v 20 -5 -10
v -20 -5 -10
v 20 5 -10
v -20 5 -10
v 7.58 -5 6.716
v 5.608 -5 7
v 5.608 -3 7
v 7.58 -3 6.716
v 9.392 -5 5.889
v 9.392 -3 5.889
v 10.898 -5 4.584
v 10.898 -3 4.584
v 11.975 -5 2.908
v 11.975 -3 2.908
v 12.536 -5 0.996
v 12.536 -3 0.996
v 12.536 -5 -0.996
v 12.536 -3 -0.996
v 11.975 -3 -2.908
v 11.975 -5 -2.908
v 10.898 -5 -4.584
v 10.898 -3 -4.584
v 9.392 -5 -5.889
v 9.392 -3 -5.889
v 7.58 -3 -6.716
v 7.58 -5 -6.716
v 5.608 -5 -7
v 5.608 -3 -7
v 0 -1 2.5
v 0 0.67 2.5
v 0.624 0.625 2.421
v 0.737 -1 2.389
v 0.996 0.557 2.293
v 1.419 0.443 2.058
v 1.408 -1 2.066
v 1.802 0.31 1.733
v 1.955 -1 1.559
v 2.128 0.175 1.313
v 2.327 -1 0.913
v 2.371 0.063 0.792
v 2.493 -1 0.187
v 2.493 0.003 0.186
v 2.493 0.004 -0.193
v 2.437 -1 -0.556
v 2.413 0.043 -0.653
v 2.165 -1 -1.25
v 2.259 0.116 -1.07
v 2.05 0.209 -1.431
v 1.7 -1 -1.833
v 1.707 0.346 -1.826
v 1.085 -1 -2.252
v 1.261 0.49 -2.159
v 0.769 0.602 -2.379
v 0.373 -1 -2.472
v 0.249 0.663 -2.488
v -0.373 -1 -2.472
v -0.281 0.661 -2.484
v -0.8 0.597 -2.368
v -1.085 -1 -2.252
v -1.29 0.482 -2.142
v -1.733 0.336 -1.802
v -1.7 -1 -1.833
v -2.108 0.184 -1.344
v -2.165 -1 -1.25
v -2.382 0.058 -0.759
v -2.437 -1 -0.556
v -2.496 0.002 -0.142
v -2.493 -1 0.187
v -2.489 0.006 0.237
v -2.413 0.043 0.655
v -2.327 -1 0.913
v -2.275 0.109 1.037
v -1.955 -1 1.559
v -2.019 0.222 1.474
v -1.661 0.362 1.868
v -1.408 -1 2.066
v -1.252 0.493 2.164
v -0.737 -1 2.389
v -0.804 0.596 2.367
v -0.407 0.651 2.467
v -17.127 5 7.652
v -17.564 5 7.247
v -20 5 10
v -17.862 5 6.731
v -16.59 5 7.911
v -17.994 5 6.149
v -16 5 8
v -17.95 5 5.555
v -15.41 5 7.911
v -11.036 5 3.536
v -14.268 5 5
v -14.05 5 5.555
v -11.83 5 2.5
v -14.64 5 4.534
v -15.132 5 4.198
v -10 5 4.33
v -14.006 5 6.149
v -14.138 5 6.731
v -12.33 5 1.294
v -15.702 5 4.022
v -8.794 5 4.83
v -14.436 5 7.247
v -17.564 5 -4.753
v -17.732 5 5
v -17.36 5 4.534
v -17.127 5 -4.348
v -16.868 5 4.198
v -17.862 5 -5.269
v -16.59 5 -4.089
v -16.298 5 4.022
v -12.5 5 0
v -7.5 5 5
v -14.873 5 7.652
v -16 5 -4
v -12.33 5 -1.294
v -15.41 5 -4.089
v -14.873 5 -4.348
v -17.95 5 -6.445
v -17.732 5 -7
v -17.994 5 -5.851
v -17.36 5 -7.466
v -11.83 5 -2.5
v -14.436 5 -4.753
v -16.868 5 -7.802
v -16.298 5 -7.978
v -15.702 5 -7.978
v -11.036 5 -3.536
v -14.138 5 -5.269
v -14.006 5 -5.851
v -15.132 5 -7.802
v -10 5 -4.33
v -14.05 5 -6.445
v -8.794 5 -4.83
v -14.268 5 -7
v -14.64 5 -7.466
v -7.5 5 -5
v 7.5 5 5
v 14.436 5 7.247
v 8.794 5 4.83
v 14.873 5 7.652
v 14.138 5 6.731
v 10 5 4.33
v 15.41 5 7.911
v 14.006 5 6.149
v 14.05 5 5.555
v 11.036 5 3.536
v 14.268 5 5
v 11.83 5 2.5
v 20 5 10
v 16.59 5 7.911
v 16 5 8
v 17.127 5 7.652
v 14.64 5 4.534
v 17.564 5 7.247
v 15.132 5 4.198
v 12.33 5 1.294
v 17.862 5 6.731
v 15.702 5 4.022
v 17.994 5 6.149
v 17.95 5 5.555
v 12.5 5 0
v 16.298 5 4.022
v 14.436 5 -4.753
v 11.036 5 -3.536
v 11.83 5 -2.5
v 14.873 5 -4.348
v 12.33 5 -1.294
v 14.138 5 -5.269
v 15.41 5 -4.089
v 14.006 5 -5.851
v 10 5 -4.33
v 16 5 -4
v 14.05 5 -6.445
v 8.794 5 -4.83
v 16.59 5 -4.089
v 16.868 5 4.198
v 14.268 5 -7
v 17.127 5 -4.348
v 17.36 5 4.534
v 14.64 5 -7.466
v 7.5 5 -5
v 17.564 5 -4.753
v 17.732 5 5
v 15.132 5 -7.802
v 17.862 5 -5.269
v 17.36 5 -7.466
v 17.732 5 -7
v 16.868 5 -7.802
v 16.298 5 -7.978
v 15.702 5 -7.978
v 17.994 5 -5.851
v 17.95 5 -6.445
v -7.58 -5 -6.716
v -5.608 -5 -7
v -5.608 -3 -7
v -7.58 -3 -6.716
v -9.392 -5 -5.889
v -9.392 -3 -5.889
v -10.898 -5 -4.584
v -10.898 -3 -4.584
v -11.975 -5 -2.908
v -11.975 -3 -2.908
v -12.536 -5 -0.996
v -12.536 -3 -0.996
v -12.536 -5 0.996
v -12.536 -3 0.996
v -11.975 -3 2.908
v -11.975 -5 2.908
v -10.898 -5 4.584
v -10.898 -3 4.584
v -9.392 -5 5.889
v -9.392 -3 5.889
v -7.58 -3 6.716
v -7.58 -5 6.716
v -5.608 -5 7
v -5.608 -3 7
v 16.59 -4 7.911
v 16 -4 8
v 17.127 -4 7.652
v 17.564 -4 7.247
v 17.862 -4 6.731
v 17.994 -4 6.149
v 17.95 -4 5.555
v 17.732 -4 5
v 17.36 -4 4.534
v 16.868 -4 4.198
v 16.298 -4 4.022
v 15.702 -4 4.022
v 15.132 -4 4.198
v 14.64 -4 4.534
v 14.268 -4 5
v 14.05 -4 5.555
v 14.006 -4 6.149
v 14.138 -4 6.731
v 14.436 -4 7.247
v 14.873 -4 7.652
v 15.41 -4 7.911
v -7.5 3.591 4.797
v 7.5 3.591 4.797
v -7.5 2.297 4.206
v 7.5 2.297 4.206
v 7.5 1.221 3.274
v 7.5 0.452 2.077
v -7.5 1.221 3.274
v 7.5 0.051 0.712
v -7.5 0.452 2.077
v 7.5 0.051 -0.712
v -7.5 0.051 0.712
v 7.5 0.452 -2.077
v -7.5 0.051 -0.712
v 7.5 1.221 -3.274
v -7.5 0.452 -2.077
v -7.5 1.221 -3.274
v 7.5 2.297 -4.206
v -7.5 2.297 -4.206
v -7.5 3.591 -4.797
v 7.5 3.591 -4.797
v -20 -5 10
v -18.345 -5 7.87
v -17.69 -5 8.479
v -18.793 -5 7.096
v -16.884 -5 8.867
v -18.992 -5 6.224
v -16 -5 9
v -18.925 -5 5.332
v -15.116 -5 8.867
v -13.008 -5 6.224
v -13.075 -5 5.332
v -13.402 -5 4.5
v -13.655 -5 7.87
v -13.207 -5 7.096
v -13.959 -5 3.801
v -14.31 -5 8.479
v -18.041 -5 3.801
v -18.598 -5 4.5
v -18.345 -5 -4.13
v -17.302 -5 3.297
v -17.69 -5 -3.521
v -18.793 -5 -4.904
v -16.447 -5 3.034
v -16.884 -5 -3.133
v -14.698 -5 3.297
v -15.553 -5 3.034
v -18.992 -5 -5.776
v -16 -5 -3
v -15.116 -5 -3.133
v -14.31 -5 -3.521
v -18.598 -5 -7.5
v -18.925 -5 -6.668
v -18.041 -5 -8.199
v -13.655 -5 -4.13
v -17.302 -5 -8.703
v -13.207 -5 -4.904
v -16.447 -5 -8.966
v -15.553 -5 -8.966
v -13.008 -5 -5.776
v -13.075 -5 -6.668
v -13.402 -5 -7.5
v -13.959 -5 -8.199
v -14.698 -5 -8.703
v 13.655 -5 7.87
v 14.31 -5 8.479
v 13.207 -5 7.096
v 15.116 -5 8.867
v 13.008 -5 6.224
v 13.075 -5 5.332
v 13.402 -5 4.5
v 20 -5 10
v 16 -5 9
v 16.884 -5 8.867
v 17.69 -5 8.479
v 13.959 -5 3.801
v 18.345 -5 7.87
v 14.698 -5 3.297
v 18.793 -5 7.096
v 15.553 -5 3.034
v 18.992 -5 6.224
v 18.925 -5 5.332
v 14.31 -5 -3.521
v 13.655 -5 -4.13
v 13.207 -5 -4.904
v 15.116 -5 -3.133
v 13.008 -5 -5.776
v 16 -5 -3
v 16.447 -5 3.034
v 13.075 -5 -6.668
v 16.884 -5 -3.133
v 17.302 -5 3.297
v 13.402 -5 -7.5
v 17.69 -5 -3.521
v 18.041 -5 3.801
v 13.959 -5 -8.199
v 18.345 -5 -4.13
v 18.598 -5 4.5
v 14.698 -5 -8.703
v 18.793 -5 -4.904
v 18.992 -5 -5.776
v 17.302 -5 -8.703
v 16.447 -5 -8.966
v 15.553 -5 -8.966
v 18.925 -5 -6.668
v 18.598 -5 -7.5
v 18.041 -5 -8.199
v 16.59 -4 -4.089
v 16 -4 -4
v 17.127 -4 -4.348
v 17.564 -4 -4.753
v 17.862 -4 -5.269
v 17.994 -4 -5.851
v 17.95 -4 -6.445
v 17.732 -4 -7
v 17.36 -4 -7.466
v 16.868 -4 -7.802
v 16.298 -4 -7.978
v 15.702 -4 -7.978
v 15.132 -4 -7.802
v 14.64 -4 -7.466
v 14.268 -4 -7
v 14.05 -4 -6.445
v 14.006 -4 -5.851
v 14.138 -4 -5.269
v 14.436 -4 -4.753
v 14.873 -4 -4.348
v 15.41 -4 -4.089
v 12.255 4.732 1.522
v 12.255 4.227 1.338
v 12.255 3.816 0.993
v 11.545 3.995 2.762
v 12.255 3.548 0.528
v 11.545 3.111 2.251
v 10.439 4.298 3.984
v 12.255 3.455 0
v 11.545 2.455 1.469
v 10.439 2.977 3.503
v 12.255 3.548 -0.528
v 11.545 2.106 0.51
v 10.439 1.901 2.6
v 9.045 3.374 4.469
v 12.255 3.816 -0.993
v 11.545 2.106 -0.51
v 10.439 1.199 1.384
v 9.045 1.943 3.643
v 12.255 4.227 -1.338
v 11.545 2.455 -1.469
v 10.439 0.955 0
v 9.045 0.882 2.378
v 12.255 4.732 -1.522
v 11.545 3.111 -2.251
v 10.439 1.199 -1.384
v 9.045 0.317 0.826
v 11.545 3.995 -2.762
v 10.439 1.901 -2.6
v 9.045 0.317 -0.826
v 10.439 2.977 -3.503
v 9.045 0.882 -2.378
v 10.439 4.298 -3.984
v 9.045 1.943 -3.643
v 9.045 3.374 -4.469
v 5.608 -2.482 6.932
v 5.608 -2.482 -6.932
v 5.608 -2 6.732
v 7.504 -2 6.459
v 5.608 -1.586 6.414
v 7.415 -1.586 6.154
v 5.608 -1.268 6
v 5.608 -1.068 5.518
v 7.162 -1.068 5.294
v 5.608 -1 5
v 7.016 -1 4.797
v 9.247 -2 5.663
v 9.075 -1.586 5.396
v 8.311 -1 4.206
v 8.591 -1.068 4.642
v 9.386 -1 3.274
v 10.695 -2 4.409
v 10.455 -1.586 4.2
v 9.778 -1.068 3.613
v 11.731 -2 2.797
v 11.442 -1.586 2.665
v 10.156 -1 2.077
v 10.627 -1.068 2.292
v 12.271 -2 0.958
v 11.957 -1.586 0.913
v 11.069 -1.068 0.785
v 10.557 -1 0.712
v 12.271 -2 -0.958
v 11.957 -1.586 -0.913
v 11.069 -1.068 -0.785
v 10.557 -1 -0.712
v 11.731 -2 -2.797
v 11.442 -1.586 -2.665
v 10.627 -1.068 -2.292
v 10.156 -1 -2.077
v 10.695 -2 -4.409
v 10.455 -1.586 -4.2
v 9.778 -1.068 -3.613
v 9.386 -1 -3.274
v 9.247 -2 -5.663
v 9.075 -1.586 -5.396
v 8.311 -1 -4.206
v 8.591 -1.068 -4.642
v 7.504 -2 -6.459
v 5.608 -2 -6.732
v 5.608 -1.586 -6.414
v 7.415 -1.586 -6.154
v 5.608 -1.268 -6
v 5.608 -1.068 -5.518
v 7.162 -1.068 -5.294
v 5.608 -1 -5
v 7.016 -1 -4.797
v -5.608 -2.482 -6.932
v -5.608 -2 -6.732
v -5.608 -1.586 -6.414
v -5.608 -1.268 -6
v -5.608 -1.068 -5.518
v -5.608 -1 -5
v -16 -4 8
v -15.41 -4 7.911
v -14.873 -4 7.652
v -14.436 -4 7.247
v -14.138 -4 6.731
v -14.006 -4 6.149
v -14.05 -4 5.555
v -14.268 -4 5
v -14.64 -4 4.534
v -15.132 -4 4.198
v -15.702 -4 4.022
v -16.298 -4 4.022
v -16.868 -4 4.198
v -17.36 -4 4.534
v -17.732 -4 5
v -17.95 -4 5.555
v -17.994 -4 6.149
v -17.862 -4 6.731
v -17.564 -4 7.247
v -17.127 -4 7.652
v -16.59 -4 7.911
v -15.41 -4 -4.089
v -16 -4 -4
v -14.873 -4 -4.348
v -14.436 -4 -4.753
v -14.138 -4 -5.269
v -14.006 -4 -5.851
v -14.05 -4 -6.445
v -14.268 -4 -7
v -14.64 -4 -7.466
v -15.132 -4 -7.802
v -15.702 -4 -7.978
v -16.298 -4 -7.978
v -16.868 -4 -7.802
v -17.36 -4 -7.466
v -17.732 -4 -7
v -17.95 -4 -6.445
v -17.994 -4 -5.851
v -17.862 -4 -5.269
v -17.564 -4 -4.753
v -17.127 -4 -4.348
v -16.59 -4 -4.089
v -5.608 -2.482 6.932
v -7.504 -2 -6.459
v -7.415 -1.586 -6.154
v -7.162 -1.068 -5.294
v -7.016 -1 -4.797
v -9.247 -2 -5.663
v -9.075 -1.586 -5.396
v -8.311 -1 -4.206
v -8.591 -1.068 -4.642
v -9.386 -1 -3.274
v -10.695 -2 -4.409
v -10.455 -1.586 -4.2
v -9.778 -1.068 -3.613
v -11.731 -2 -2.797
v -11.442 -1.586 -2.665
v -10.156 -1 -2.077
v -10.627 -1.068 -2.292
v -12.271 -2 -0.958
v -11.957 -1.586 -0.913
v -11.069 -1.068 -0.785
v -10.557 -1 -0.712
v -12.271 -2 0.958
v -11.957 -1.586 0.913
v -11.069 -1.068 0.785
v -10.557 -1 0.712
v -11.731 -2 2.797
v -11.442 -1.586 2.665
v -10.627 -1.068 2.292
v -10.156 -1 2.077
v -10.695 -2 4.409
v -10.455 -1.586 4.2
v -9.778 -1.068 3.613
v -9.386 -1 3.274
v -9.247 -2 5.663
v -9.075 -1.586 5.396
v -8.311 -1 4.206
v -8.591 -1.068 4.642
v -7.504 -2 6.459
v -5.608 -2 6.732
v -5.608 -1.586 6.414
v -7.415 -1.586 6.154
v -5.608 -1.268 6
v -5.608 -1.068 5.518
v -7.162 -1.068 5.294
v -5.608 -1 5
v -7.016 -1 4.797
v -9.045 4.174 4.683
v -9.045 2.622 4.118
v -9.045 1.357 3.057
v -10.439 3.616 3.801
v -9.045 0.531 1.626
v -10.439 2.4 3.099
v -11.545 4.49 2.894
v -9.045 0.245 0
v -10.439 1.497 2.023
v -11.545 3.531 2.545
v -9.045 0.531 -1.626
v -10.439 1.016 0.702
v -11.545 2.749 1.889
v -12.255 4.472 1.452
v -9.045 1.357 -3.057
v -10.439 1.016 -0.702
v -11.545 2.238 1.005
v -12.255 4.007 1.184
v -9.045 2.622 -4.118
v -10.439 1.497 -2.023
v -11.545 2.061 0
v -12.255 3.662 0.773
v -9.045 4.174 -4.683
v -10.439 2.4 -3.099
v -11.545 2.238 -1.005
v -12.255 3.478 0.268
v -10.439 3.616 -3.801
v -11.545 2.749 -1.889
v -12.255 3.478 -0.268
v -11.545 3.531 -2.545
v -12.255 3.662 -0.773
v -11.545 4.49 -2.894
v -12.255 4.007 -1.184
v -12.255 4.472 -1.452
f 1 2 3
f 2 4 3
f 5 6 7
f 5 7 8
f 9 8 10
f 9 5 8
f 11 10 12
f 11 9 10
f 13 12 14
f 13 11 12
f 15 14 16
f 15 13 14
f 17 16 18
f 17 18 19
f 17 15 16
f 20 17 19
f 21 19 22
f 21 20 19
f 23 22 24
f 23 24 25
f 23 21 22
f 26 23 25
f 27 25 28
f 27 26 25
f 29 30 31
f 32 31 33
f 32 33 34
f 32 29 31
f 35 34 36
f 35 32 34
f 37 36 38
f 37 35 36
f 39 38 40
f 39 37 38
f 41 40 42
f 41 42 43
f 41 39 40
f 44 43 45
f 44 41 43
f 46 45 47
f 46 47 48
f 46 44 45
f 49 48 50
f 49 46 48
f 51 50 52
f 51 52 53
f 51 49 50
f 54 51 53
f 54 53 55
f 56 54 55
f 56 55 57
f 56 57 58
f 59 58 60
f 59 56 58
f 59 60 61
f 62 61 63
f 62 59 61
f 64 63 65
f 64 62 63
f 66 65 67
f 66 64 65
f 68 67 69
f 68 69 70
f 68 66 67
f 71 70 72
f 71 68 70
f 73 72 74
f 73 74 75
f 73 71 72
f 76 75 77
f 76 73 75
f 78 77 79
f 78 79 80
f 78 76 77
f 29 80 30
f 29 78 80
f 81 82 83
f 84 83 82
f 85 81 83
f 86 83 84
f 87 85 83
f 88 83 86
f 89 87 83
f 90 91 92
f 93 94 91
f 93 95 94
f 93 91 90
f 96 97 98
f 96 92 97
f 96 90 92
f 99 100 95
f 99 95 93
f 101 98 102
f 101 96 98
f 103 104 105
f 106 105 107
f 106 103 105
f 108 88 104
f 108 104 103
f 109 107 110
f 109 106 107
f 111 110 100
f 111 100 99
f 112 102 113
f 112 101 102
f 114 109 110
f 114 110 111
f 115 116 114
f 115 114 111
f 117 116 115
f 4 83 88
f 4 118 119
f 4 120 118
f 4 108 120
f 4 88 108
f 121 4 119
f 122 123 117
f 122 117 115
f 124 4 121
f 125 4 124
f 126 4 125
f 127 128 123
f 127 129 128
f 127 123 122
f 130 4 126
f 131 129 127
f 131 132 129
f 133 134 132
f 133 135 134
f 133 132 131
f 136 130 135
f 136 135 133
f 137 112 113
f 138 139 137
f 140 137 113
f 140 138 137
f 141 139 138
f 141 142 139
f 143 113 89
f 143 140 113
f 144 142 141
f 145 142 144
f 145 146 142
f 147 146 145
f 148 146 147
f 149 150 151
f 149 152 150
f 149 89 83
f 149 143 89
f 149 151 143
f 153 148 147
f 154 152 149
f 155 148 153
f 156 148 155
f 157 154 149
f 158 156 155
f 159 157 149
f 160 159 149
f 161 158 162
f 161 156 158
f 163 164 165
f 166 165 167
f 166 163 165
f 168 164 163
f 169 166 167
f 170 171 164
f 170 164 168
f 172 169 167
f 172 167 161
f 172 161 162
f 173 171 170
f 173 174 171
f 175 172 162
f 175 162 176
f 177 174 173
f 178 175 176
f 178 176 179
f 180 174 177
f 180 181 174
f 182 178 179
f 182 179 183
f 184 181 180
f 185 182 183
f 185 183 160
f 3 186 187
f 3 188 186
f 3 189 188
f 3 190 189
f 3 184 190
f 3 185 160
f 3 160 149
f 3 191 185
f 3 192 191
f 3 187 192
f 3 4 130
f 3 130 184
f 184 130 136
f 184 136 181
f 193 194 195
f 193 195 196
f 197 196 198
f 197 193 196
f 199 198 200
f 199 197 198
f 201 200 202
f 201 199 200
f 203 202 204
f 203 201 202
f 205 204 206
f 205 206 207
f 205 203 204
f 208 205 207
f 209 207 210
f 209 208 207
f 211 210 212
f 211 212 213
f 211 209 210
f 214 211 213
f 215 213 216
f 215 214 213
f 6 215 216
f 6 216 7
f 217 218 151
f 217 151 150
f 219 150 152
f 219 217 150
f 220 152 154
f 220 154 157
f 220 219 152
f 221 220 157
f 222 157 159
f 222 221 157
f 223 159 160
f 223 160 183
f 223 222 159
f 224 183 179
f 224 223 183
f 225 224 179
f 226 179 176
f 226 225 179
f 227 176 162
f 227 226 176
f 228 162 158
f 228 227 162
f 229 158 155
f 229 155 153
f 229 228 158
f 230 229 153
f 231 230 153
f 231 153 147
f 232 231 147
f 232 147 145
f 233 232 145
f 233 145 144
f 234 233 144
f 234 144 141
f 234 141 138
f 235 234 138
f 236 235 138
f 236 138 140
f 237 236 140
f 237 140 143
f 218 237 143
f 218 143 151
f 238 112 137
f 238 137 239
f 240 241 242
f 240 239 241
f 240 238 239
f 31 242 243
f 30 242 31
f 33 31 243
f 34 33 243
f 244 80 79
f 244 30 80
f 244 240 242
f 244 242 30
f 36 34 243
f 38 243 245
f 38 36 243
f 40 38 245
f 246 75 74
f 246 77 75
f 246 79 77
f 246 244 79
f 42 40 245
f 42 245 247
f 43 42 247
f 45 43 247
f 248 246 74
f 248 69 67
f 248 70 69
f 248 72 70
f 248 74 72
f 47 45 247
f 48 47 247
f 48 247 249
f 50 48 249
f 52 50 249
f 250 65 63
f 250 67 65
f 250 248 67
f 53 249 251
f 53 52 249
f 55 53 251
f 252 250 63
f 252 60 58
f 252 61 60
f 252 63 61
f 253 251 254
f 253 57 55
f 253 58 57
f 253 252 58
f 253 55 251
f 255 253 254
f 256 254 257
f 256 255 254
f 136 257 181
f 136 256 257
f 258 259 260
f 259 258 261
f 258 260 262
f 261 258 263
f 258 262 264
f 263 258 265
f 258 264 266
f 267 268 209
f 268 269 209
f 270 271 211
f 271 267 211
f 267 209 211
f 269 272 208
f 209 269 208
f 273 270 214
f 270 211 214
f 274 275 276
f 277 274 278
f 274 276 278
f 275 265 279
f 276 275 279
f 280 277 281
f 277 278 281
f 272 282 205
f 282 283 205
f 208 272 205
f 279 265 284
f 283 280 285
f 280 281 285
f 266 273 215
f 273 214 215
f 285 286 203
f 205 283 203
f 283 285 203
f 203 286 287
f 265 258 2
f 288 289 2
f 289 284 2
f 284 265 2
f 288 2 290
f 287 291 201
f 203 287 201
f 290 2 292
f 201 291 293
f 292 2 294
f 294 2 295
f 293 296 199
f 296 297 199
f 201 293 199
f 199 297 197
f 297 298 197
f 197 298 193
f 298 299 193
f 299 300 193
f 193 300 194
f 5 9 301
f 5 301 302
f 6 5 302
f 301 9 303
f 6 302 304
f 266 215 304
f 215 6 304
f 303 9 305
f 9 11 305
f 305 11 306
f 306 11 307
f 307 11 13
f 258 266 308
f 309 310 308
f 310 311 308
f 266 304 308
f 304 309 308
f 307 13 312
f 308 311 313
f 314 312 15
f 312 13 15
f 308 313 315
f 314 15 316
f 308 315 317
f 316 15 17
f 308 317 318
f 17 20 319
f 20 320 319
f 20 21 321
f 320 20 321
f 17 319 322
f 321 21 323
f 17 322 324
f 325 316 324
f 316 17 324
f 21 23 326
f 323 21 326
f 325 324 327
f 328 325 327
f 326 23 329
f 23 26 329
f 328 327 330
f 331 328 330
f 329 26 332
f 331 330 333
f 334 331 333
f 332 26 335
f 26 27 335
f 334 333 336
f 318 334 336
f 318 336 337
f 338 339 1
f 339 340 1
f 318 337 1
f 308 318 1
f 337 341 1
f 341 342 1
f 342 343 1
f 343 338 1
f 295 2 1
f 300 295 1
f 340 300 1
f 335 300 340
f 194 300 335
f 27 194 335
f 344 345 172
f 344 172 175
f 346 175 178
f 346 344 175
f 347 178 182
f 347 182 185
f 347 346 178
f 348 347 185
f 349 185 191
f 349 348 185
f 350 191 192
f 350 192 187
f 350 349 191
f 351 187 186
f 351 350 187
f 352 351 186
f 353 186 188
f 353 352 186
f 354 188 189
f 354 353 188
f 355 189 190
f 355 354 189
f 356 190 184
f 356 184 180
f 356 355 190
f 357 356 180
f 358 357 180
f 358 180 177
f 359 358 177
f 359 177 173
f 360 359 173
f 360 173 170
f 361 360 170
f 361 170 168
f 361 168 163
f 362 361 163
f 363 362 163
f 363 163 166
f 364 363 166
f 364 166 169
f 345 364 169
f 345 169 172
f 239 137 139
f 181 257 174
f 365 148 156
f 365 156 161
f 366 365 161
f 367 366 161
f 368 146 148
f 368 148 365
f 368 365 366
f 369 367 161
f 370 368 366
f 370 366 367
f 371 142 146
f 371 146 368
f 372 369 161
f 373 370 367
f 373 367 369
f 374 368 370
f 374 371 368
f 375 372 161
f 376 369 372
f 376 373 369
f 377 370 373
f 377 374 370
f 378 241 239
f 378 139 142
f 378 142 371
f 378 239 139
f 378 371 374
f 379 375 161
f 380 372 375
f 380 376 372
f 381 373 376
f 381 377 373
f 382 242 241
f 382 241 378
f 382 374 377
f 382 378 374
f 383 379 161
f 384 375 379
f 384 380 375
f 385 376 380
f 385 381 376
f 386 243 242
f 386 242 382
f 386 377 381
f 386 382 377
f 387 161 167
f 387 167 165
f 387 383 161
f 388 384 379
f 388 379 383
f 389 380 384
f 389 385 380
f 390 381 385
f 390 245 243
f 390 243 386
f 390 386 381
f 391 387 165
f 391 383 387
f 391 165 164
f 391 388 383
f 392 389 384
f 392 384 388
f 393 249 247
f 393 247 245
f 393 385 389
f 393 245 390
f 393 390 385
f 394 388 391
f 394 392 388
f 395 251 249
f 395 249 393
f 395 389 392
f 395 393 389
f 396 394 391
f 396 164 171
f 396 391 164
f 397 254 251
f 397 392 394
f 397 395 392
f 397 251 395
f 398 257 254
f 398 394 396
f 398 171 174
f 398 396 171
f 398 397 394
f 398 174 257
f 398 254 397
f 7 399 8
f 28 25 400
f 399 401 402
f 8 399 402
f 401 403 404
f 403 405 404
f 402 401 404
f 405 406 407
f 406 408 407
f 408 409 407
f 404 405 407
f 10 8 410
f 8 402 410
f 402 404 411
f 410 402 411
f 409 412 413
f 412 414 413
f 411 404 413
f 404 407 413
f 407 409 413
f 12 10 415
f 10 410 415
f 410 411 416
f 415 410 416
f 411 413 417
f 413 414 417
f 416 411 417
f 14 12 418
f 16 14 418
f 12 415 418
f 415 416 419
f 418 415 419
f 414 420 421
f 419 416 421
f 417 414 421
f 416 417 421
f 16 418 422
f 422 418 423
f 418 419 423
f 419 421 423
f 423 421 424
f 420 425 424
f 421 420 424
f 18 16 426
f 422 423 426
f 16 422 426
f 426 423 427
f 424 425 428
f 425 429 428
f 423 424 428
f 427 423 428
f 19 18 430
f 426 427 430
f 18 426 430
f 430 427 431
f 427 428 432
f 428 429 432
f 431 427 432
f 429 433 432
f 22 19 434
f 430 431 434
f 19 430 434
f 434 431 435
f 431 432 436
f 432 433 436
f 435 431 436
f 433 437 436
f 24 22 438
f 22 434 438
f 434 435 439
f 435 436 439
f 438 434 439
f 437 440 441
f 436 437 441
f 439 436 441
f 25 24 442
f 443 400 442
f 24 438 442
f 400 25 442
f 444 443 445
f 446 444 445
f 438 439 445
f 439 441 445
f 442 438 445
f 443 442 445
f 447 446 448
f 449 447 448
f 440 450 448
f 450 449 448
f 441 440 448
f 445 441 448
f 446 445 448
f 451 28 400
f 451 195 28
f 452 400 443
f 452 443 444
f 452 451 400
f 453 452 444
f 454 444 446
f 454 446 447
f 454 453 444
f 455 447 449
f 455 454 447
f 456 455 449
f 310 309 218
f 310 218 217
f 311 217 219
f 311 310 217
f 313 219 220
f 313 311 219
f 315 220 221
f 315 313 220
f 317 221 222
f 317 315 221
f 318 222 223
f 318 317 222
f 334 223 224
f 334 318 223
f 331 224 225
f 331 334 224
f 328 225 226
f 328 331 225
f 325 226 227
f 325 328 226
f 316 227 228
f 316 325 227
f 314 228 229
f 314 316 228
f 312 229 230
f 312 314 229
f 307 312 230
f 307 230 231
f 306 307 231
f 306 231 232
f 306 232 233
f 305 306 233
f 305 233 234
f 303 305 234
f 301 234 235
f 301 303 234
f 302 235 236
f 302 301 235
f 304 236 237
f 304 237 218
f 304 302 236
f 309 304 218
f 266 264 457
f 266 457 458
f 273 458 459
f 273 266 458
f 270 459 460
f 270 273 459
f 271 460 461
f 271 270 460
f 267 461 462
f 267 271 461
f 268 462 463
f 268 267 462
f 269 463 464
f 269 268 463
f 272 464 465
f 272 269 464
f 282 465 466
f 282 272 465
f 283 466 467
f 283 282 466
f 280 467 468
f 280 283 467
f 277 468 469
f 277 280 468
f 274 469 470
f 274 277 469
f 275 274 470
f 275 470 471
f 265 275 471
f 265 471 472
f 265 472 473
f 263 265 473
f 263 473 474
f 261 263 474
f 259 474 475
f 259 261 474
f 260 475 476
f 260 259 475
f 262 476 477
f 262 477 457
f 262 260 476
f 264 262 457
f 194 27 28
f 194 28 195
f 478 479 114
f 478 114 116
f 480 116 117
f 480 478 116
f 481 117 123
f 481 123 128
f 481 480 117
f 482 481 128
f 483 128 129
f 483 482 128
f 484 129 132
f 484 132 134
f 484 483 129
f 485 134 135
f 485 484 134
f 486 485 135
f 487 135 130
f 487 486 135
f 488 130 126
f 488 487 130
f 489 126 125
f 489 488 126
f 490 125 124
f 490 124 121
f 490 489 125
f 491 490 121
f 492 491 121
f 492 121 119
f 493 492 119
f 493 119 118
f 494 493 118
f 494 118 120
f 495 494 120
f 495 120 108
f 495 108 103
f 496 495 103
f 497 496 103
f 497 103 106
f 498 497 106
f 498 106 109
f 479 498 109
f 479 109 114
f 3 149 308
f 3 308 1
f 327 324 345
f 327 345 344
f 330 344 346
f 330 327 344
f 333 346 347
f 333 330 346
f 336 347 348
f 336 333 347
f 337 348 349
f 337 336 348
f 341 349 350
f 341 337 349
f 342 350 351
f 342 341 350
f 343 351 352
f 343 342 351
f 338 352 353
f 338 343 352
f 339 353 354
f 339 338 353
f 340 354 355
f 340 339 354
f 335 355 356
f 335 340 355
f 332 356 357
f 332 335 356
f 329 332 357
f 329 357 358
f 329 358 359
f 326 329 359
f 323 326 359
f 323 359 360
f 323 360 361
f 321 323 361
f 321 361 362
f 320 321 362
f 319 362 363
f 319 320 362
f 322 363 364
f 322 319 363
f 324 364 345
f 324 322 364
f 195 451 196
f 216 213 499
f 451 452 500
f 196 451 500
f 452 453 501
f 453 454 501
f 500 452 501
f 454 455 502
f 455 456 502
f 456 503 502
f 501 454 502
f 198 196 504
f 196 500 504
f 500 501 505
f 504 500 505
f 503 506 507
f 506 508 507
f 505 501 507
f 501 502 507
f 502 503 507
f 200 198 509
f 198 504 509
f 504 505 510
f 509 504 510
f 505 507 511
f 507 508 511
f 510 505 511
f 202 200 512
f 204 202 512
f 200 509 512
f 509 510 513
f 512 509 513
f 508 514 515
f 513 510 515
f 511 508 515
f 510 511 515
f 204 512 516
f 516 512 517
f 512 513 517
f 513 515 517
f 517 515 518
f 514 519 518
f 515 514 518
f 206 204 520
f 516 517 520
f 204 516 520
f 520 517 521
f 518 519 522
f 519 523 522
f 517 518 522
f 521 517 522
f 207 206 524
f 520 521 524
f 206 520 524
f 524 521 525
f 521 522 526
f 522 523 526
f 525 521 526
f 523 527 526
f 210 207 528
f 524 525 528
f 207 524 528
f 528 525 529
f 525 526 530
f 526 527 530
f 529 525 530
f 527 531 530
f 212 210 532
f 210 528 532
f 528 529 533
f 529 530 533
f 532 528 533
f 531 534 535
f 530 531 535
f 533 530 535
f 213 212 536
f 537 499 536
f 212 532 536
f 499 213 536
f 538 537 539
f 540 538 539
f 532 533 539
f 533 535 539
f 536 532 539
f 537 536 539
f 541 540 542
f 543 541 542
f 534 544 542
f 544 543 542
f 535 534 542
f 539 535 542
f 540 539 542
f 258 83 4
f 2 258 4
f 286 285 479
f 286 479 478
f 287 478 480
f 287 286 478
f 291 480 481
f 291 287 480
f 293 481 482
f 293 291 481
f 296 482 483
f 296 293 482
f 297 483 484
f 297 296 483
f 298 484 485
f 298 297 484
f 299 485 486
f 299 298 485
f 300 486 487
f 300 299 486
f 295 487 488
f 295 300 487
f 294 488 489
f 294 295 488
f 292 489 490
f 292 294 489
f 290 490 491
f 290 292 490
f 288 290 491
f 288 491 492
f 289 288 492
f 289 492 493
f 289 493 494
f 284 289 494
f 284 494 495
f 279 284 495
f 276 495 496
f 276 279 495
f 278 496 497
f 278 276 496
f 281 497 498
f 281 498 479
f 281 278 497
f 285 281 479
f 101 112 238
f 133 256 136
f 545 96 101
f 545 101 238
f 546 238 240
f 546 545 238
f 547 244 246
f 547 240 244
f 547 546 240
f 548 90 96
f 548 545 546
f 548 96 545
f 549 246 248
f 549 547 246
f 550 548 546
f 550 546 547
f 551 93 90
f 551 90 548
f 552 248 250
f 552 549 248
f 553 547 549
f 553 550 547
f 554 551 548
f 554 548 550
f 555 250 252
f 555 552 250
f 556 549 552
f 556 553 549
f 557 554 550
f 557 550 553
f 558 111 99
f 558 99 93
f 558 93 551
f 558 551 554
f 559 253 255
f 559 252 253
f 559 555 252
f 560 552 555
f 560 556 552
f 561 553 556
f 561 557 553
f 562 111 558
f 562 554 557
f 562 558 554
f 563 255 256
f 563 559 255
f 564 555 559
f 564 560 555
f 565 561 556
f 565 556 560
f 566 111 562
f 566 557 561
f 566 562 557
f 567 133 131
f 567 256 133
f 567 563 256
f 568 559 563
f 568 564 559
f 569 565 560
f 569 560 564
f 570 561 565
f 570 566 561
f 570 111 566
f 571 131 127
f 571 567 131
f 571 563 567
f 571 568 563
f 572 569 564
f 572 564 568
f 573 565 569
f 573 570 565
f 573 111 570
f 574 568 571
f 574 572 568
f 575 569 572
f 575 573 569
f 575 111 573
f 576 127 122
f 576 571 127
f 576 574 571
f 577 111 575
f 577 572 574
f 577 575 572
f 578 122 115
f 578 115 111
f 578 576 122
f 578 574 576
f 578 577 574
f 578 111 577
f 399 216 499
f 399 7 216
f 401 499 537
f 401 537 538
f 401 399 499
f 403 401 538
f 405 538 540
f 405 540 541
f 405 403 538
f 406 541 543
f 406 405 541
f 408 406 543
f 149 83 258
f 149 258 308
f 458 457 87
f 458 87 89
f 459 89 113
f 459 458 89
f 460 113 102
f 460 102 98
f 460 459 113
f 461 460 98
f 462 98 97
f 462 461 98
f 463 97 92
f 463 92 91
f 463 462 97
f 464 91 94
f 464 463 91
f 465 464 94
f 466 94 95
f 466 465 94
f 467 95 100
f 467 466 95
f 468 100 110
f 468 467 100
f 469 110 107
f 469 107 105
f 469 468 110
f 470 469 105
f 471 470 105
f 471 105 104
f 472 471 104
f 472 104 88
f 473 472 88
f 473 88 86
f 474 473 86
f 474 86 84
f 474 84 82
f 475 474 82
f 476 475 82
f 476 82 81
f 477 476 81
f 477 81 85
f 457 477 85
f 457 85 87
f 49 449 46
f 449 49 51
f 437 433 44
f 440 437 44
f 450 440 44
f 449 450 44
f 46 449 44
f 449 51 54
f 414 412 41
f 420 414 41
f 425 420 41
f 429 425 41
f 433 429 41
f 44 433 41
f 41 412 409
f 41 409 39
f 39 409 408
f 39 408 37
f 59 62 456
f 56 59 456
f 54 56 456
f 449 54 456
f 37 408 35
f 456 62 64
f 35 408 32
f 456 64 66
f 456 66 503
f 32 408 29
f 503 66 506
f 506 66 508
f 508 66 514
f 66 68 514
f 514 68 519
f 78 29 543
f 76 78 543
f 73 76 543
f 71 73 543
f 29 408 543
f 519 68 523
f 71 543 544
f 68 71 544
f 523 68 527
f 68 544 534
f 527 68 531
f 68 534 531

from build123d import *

# Parameters (mm, degrees)
SKETCH1_W           = 40
SKETCH1_H           = 20
SKETCH1_R           = 2
SKETCH1_R_2         = 2.5
BOSS_EXTRUDE1_DEPTH = 5
CHAMFER1_SIZE       = 1
CUT_EXTRUDE1_DEPTH  = 4
FILLET1_R           = 2


with BuildPart() as part:
    # Sketch1 → Boss-Extrude1 (new, symmetric)
    with BuildSketch(Plane(origin=(0, 0, 0), x_dir=(1, 0, 0), z_dir=(0, 1, 0))):
        Rectangle(SKETCH1_W, SKETCH1_H)
        with Locations(Location((-16, 6, 0), (0, 0, 270))):
            Circle(SKETCH1_R, mode=Mode.SUBTRACT)
        with Locations(Location((16, 6, 0), (0, 0, 270))):
            Circle(SKETCH1_R, mode=Mode.SUBTRACT)
        with Locations(Location((16, -6, 0), (0, 0, 270))):
            Circle(SKETCH1_R, mode=Mode.SUBTRACT)
        with Locations(Location((-16, -6, 0), (0, 0, 270))):
            Circle(SKETCH1_R, mode=Mode.SUBTRACT)
        with Locations(Location((0, 0, 0), (0, 0, 270))):
            Circle(SKETCH1_R_2, mode=Mode.SUBTRACT)
    extrude(amount=BOSS_EXTRUDE1_DEPTH, both=True)

    # Sketch2 → Cut-Revolve1 (revolve, cut)
    with BuildSketch(Plane.XY):
        with BuildLine():
            Line((-12.5, 5), (12.5, 5))
            ThreePointArc((12.5, 5), (11.035533906, 1.464466094), (7.5, 0))
            Line((7.5, 0), (-7.5, 0))
            ThreePointArc((-7.5, 0), (-11.035533906, 1.464466094), (-12.5, 5))
        make_face()
    revolve(axis=Axis((-12.5, 5, 0), (1, 0, 0)), mode=Mode.SUBTRACT)

    # Chamfer1
    chamfer1_edges = [part.edges().sort_by_distance(p)[0] for p in [
        (-16, -5, -8),
        (16, -5, -8),
        (16, -5, 4),
        (-16, -5, 4),
    ]]
    chamfer(chamfer1_edges, length=CHAMFER1_SIZE)

    # Sketch3 → Cut-Extrude1 (cut)
    with BuildSketch(Plane.XZ.offset(5)):
        with BuildLine():
            Line((-5.607695155, 7), (5.607695155, 7))
            ThreePointArc((5.607695155, 7), (12.607695155, 0), (5.607695155, -7))
            Line((5.607695155, -7), (-5.607695155, -7))
            ThreePointArc((-5.607695155, -7), (-12.607695155, 0), (-5.607695155, 7))
        make_face()
    extrude(amount=-CUT_EXTRUDE1_DEPTH, mode=Mode.SUBTRACT)

    # Fillet1
    fillet1_edges = [part.edges().sort_by_distance(p)[0] for p in [
        (-12.607695155, -1, 0),
        (0, -1, 7),
        (12.607695155, -1, 0),
        (0, -1, -7),
    ]]
    fillet(fillet1_edges, radius=FILLET1_R)


solid = part.part
